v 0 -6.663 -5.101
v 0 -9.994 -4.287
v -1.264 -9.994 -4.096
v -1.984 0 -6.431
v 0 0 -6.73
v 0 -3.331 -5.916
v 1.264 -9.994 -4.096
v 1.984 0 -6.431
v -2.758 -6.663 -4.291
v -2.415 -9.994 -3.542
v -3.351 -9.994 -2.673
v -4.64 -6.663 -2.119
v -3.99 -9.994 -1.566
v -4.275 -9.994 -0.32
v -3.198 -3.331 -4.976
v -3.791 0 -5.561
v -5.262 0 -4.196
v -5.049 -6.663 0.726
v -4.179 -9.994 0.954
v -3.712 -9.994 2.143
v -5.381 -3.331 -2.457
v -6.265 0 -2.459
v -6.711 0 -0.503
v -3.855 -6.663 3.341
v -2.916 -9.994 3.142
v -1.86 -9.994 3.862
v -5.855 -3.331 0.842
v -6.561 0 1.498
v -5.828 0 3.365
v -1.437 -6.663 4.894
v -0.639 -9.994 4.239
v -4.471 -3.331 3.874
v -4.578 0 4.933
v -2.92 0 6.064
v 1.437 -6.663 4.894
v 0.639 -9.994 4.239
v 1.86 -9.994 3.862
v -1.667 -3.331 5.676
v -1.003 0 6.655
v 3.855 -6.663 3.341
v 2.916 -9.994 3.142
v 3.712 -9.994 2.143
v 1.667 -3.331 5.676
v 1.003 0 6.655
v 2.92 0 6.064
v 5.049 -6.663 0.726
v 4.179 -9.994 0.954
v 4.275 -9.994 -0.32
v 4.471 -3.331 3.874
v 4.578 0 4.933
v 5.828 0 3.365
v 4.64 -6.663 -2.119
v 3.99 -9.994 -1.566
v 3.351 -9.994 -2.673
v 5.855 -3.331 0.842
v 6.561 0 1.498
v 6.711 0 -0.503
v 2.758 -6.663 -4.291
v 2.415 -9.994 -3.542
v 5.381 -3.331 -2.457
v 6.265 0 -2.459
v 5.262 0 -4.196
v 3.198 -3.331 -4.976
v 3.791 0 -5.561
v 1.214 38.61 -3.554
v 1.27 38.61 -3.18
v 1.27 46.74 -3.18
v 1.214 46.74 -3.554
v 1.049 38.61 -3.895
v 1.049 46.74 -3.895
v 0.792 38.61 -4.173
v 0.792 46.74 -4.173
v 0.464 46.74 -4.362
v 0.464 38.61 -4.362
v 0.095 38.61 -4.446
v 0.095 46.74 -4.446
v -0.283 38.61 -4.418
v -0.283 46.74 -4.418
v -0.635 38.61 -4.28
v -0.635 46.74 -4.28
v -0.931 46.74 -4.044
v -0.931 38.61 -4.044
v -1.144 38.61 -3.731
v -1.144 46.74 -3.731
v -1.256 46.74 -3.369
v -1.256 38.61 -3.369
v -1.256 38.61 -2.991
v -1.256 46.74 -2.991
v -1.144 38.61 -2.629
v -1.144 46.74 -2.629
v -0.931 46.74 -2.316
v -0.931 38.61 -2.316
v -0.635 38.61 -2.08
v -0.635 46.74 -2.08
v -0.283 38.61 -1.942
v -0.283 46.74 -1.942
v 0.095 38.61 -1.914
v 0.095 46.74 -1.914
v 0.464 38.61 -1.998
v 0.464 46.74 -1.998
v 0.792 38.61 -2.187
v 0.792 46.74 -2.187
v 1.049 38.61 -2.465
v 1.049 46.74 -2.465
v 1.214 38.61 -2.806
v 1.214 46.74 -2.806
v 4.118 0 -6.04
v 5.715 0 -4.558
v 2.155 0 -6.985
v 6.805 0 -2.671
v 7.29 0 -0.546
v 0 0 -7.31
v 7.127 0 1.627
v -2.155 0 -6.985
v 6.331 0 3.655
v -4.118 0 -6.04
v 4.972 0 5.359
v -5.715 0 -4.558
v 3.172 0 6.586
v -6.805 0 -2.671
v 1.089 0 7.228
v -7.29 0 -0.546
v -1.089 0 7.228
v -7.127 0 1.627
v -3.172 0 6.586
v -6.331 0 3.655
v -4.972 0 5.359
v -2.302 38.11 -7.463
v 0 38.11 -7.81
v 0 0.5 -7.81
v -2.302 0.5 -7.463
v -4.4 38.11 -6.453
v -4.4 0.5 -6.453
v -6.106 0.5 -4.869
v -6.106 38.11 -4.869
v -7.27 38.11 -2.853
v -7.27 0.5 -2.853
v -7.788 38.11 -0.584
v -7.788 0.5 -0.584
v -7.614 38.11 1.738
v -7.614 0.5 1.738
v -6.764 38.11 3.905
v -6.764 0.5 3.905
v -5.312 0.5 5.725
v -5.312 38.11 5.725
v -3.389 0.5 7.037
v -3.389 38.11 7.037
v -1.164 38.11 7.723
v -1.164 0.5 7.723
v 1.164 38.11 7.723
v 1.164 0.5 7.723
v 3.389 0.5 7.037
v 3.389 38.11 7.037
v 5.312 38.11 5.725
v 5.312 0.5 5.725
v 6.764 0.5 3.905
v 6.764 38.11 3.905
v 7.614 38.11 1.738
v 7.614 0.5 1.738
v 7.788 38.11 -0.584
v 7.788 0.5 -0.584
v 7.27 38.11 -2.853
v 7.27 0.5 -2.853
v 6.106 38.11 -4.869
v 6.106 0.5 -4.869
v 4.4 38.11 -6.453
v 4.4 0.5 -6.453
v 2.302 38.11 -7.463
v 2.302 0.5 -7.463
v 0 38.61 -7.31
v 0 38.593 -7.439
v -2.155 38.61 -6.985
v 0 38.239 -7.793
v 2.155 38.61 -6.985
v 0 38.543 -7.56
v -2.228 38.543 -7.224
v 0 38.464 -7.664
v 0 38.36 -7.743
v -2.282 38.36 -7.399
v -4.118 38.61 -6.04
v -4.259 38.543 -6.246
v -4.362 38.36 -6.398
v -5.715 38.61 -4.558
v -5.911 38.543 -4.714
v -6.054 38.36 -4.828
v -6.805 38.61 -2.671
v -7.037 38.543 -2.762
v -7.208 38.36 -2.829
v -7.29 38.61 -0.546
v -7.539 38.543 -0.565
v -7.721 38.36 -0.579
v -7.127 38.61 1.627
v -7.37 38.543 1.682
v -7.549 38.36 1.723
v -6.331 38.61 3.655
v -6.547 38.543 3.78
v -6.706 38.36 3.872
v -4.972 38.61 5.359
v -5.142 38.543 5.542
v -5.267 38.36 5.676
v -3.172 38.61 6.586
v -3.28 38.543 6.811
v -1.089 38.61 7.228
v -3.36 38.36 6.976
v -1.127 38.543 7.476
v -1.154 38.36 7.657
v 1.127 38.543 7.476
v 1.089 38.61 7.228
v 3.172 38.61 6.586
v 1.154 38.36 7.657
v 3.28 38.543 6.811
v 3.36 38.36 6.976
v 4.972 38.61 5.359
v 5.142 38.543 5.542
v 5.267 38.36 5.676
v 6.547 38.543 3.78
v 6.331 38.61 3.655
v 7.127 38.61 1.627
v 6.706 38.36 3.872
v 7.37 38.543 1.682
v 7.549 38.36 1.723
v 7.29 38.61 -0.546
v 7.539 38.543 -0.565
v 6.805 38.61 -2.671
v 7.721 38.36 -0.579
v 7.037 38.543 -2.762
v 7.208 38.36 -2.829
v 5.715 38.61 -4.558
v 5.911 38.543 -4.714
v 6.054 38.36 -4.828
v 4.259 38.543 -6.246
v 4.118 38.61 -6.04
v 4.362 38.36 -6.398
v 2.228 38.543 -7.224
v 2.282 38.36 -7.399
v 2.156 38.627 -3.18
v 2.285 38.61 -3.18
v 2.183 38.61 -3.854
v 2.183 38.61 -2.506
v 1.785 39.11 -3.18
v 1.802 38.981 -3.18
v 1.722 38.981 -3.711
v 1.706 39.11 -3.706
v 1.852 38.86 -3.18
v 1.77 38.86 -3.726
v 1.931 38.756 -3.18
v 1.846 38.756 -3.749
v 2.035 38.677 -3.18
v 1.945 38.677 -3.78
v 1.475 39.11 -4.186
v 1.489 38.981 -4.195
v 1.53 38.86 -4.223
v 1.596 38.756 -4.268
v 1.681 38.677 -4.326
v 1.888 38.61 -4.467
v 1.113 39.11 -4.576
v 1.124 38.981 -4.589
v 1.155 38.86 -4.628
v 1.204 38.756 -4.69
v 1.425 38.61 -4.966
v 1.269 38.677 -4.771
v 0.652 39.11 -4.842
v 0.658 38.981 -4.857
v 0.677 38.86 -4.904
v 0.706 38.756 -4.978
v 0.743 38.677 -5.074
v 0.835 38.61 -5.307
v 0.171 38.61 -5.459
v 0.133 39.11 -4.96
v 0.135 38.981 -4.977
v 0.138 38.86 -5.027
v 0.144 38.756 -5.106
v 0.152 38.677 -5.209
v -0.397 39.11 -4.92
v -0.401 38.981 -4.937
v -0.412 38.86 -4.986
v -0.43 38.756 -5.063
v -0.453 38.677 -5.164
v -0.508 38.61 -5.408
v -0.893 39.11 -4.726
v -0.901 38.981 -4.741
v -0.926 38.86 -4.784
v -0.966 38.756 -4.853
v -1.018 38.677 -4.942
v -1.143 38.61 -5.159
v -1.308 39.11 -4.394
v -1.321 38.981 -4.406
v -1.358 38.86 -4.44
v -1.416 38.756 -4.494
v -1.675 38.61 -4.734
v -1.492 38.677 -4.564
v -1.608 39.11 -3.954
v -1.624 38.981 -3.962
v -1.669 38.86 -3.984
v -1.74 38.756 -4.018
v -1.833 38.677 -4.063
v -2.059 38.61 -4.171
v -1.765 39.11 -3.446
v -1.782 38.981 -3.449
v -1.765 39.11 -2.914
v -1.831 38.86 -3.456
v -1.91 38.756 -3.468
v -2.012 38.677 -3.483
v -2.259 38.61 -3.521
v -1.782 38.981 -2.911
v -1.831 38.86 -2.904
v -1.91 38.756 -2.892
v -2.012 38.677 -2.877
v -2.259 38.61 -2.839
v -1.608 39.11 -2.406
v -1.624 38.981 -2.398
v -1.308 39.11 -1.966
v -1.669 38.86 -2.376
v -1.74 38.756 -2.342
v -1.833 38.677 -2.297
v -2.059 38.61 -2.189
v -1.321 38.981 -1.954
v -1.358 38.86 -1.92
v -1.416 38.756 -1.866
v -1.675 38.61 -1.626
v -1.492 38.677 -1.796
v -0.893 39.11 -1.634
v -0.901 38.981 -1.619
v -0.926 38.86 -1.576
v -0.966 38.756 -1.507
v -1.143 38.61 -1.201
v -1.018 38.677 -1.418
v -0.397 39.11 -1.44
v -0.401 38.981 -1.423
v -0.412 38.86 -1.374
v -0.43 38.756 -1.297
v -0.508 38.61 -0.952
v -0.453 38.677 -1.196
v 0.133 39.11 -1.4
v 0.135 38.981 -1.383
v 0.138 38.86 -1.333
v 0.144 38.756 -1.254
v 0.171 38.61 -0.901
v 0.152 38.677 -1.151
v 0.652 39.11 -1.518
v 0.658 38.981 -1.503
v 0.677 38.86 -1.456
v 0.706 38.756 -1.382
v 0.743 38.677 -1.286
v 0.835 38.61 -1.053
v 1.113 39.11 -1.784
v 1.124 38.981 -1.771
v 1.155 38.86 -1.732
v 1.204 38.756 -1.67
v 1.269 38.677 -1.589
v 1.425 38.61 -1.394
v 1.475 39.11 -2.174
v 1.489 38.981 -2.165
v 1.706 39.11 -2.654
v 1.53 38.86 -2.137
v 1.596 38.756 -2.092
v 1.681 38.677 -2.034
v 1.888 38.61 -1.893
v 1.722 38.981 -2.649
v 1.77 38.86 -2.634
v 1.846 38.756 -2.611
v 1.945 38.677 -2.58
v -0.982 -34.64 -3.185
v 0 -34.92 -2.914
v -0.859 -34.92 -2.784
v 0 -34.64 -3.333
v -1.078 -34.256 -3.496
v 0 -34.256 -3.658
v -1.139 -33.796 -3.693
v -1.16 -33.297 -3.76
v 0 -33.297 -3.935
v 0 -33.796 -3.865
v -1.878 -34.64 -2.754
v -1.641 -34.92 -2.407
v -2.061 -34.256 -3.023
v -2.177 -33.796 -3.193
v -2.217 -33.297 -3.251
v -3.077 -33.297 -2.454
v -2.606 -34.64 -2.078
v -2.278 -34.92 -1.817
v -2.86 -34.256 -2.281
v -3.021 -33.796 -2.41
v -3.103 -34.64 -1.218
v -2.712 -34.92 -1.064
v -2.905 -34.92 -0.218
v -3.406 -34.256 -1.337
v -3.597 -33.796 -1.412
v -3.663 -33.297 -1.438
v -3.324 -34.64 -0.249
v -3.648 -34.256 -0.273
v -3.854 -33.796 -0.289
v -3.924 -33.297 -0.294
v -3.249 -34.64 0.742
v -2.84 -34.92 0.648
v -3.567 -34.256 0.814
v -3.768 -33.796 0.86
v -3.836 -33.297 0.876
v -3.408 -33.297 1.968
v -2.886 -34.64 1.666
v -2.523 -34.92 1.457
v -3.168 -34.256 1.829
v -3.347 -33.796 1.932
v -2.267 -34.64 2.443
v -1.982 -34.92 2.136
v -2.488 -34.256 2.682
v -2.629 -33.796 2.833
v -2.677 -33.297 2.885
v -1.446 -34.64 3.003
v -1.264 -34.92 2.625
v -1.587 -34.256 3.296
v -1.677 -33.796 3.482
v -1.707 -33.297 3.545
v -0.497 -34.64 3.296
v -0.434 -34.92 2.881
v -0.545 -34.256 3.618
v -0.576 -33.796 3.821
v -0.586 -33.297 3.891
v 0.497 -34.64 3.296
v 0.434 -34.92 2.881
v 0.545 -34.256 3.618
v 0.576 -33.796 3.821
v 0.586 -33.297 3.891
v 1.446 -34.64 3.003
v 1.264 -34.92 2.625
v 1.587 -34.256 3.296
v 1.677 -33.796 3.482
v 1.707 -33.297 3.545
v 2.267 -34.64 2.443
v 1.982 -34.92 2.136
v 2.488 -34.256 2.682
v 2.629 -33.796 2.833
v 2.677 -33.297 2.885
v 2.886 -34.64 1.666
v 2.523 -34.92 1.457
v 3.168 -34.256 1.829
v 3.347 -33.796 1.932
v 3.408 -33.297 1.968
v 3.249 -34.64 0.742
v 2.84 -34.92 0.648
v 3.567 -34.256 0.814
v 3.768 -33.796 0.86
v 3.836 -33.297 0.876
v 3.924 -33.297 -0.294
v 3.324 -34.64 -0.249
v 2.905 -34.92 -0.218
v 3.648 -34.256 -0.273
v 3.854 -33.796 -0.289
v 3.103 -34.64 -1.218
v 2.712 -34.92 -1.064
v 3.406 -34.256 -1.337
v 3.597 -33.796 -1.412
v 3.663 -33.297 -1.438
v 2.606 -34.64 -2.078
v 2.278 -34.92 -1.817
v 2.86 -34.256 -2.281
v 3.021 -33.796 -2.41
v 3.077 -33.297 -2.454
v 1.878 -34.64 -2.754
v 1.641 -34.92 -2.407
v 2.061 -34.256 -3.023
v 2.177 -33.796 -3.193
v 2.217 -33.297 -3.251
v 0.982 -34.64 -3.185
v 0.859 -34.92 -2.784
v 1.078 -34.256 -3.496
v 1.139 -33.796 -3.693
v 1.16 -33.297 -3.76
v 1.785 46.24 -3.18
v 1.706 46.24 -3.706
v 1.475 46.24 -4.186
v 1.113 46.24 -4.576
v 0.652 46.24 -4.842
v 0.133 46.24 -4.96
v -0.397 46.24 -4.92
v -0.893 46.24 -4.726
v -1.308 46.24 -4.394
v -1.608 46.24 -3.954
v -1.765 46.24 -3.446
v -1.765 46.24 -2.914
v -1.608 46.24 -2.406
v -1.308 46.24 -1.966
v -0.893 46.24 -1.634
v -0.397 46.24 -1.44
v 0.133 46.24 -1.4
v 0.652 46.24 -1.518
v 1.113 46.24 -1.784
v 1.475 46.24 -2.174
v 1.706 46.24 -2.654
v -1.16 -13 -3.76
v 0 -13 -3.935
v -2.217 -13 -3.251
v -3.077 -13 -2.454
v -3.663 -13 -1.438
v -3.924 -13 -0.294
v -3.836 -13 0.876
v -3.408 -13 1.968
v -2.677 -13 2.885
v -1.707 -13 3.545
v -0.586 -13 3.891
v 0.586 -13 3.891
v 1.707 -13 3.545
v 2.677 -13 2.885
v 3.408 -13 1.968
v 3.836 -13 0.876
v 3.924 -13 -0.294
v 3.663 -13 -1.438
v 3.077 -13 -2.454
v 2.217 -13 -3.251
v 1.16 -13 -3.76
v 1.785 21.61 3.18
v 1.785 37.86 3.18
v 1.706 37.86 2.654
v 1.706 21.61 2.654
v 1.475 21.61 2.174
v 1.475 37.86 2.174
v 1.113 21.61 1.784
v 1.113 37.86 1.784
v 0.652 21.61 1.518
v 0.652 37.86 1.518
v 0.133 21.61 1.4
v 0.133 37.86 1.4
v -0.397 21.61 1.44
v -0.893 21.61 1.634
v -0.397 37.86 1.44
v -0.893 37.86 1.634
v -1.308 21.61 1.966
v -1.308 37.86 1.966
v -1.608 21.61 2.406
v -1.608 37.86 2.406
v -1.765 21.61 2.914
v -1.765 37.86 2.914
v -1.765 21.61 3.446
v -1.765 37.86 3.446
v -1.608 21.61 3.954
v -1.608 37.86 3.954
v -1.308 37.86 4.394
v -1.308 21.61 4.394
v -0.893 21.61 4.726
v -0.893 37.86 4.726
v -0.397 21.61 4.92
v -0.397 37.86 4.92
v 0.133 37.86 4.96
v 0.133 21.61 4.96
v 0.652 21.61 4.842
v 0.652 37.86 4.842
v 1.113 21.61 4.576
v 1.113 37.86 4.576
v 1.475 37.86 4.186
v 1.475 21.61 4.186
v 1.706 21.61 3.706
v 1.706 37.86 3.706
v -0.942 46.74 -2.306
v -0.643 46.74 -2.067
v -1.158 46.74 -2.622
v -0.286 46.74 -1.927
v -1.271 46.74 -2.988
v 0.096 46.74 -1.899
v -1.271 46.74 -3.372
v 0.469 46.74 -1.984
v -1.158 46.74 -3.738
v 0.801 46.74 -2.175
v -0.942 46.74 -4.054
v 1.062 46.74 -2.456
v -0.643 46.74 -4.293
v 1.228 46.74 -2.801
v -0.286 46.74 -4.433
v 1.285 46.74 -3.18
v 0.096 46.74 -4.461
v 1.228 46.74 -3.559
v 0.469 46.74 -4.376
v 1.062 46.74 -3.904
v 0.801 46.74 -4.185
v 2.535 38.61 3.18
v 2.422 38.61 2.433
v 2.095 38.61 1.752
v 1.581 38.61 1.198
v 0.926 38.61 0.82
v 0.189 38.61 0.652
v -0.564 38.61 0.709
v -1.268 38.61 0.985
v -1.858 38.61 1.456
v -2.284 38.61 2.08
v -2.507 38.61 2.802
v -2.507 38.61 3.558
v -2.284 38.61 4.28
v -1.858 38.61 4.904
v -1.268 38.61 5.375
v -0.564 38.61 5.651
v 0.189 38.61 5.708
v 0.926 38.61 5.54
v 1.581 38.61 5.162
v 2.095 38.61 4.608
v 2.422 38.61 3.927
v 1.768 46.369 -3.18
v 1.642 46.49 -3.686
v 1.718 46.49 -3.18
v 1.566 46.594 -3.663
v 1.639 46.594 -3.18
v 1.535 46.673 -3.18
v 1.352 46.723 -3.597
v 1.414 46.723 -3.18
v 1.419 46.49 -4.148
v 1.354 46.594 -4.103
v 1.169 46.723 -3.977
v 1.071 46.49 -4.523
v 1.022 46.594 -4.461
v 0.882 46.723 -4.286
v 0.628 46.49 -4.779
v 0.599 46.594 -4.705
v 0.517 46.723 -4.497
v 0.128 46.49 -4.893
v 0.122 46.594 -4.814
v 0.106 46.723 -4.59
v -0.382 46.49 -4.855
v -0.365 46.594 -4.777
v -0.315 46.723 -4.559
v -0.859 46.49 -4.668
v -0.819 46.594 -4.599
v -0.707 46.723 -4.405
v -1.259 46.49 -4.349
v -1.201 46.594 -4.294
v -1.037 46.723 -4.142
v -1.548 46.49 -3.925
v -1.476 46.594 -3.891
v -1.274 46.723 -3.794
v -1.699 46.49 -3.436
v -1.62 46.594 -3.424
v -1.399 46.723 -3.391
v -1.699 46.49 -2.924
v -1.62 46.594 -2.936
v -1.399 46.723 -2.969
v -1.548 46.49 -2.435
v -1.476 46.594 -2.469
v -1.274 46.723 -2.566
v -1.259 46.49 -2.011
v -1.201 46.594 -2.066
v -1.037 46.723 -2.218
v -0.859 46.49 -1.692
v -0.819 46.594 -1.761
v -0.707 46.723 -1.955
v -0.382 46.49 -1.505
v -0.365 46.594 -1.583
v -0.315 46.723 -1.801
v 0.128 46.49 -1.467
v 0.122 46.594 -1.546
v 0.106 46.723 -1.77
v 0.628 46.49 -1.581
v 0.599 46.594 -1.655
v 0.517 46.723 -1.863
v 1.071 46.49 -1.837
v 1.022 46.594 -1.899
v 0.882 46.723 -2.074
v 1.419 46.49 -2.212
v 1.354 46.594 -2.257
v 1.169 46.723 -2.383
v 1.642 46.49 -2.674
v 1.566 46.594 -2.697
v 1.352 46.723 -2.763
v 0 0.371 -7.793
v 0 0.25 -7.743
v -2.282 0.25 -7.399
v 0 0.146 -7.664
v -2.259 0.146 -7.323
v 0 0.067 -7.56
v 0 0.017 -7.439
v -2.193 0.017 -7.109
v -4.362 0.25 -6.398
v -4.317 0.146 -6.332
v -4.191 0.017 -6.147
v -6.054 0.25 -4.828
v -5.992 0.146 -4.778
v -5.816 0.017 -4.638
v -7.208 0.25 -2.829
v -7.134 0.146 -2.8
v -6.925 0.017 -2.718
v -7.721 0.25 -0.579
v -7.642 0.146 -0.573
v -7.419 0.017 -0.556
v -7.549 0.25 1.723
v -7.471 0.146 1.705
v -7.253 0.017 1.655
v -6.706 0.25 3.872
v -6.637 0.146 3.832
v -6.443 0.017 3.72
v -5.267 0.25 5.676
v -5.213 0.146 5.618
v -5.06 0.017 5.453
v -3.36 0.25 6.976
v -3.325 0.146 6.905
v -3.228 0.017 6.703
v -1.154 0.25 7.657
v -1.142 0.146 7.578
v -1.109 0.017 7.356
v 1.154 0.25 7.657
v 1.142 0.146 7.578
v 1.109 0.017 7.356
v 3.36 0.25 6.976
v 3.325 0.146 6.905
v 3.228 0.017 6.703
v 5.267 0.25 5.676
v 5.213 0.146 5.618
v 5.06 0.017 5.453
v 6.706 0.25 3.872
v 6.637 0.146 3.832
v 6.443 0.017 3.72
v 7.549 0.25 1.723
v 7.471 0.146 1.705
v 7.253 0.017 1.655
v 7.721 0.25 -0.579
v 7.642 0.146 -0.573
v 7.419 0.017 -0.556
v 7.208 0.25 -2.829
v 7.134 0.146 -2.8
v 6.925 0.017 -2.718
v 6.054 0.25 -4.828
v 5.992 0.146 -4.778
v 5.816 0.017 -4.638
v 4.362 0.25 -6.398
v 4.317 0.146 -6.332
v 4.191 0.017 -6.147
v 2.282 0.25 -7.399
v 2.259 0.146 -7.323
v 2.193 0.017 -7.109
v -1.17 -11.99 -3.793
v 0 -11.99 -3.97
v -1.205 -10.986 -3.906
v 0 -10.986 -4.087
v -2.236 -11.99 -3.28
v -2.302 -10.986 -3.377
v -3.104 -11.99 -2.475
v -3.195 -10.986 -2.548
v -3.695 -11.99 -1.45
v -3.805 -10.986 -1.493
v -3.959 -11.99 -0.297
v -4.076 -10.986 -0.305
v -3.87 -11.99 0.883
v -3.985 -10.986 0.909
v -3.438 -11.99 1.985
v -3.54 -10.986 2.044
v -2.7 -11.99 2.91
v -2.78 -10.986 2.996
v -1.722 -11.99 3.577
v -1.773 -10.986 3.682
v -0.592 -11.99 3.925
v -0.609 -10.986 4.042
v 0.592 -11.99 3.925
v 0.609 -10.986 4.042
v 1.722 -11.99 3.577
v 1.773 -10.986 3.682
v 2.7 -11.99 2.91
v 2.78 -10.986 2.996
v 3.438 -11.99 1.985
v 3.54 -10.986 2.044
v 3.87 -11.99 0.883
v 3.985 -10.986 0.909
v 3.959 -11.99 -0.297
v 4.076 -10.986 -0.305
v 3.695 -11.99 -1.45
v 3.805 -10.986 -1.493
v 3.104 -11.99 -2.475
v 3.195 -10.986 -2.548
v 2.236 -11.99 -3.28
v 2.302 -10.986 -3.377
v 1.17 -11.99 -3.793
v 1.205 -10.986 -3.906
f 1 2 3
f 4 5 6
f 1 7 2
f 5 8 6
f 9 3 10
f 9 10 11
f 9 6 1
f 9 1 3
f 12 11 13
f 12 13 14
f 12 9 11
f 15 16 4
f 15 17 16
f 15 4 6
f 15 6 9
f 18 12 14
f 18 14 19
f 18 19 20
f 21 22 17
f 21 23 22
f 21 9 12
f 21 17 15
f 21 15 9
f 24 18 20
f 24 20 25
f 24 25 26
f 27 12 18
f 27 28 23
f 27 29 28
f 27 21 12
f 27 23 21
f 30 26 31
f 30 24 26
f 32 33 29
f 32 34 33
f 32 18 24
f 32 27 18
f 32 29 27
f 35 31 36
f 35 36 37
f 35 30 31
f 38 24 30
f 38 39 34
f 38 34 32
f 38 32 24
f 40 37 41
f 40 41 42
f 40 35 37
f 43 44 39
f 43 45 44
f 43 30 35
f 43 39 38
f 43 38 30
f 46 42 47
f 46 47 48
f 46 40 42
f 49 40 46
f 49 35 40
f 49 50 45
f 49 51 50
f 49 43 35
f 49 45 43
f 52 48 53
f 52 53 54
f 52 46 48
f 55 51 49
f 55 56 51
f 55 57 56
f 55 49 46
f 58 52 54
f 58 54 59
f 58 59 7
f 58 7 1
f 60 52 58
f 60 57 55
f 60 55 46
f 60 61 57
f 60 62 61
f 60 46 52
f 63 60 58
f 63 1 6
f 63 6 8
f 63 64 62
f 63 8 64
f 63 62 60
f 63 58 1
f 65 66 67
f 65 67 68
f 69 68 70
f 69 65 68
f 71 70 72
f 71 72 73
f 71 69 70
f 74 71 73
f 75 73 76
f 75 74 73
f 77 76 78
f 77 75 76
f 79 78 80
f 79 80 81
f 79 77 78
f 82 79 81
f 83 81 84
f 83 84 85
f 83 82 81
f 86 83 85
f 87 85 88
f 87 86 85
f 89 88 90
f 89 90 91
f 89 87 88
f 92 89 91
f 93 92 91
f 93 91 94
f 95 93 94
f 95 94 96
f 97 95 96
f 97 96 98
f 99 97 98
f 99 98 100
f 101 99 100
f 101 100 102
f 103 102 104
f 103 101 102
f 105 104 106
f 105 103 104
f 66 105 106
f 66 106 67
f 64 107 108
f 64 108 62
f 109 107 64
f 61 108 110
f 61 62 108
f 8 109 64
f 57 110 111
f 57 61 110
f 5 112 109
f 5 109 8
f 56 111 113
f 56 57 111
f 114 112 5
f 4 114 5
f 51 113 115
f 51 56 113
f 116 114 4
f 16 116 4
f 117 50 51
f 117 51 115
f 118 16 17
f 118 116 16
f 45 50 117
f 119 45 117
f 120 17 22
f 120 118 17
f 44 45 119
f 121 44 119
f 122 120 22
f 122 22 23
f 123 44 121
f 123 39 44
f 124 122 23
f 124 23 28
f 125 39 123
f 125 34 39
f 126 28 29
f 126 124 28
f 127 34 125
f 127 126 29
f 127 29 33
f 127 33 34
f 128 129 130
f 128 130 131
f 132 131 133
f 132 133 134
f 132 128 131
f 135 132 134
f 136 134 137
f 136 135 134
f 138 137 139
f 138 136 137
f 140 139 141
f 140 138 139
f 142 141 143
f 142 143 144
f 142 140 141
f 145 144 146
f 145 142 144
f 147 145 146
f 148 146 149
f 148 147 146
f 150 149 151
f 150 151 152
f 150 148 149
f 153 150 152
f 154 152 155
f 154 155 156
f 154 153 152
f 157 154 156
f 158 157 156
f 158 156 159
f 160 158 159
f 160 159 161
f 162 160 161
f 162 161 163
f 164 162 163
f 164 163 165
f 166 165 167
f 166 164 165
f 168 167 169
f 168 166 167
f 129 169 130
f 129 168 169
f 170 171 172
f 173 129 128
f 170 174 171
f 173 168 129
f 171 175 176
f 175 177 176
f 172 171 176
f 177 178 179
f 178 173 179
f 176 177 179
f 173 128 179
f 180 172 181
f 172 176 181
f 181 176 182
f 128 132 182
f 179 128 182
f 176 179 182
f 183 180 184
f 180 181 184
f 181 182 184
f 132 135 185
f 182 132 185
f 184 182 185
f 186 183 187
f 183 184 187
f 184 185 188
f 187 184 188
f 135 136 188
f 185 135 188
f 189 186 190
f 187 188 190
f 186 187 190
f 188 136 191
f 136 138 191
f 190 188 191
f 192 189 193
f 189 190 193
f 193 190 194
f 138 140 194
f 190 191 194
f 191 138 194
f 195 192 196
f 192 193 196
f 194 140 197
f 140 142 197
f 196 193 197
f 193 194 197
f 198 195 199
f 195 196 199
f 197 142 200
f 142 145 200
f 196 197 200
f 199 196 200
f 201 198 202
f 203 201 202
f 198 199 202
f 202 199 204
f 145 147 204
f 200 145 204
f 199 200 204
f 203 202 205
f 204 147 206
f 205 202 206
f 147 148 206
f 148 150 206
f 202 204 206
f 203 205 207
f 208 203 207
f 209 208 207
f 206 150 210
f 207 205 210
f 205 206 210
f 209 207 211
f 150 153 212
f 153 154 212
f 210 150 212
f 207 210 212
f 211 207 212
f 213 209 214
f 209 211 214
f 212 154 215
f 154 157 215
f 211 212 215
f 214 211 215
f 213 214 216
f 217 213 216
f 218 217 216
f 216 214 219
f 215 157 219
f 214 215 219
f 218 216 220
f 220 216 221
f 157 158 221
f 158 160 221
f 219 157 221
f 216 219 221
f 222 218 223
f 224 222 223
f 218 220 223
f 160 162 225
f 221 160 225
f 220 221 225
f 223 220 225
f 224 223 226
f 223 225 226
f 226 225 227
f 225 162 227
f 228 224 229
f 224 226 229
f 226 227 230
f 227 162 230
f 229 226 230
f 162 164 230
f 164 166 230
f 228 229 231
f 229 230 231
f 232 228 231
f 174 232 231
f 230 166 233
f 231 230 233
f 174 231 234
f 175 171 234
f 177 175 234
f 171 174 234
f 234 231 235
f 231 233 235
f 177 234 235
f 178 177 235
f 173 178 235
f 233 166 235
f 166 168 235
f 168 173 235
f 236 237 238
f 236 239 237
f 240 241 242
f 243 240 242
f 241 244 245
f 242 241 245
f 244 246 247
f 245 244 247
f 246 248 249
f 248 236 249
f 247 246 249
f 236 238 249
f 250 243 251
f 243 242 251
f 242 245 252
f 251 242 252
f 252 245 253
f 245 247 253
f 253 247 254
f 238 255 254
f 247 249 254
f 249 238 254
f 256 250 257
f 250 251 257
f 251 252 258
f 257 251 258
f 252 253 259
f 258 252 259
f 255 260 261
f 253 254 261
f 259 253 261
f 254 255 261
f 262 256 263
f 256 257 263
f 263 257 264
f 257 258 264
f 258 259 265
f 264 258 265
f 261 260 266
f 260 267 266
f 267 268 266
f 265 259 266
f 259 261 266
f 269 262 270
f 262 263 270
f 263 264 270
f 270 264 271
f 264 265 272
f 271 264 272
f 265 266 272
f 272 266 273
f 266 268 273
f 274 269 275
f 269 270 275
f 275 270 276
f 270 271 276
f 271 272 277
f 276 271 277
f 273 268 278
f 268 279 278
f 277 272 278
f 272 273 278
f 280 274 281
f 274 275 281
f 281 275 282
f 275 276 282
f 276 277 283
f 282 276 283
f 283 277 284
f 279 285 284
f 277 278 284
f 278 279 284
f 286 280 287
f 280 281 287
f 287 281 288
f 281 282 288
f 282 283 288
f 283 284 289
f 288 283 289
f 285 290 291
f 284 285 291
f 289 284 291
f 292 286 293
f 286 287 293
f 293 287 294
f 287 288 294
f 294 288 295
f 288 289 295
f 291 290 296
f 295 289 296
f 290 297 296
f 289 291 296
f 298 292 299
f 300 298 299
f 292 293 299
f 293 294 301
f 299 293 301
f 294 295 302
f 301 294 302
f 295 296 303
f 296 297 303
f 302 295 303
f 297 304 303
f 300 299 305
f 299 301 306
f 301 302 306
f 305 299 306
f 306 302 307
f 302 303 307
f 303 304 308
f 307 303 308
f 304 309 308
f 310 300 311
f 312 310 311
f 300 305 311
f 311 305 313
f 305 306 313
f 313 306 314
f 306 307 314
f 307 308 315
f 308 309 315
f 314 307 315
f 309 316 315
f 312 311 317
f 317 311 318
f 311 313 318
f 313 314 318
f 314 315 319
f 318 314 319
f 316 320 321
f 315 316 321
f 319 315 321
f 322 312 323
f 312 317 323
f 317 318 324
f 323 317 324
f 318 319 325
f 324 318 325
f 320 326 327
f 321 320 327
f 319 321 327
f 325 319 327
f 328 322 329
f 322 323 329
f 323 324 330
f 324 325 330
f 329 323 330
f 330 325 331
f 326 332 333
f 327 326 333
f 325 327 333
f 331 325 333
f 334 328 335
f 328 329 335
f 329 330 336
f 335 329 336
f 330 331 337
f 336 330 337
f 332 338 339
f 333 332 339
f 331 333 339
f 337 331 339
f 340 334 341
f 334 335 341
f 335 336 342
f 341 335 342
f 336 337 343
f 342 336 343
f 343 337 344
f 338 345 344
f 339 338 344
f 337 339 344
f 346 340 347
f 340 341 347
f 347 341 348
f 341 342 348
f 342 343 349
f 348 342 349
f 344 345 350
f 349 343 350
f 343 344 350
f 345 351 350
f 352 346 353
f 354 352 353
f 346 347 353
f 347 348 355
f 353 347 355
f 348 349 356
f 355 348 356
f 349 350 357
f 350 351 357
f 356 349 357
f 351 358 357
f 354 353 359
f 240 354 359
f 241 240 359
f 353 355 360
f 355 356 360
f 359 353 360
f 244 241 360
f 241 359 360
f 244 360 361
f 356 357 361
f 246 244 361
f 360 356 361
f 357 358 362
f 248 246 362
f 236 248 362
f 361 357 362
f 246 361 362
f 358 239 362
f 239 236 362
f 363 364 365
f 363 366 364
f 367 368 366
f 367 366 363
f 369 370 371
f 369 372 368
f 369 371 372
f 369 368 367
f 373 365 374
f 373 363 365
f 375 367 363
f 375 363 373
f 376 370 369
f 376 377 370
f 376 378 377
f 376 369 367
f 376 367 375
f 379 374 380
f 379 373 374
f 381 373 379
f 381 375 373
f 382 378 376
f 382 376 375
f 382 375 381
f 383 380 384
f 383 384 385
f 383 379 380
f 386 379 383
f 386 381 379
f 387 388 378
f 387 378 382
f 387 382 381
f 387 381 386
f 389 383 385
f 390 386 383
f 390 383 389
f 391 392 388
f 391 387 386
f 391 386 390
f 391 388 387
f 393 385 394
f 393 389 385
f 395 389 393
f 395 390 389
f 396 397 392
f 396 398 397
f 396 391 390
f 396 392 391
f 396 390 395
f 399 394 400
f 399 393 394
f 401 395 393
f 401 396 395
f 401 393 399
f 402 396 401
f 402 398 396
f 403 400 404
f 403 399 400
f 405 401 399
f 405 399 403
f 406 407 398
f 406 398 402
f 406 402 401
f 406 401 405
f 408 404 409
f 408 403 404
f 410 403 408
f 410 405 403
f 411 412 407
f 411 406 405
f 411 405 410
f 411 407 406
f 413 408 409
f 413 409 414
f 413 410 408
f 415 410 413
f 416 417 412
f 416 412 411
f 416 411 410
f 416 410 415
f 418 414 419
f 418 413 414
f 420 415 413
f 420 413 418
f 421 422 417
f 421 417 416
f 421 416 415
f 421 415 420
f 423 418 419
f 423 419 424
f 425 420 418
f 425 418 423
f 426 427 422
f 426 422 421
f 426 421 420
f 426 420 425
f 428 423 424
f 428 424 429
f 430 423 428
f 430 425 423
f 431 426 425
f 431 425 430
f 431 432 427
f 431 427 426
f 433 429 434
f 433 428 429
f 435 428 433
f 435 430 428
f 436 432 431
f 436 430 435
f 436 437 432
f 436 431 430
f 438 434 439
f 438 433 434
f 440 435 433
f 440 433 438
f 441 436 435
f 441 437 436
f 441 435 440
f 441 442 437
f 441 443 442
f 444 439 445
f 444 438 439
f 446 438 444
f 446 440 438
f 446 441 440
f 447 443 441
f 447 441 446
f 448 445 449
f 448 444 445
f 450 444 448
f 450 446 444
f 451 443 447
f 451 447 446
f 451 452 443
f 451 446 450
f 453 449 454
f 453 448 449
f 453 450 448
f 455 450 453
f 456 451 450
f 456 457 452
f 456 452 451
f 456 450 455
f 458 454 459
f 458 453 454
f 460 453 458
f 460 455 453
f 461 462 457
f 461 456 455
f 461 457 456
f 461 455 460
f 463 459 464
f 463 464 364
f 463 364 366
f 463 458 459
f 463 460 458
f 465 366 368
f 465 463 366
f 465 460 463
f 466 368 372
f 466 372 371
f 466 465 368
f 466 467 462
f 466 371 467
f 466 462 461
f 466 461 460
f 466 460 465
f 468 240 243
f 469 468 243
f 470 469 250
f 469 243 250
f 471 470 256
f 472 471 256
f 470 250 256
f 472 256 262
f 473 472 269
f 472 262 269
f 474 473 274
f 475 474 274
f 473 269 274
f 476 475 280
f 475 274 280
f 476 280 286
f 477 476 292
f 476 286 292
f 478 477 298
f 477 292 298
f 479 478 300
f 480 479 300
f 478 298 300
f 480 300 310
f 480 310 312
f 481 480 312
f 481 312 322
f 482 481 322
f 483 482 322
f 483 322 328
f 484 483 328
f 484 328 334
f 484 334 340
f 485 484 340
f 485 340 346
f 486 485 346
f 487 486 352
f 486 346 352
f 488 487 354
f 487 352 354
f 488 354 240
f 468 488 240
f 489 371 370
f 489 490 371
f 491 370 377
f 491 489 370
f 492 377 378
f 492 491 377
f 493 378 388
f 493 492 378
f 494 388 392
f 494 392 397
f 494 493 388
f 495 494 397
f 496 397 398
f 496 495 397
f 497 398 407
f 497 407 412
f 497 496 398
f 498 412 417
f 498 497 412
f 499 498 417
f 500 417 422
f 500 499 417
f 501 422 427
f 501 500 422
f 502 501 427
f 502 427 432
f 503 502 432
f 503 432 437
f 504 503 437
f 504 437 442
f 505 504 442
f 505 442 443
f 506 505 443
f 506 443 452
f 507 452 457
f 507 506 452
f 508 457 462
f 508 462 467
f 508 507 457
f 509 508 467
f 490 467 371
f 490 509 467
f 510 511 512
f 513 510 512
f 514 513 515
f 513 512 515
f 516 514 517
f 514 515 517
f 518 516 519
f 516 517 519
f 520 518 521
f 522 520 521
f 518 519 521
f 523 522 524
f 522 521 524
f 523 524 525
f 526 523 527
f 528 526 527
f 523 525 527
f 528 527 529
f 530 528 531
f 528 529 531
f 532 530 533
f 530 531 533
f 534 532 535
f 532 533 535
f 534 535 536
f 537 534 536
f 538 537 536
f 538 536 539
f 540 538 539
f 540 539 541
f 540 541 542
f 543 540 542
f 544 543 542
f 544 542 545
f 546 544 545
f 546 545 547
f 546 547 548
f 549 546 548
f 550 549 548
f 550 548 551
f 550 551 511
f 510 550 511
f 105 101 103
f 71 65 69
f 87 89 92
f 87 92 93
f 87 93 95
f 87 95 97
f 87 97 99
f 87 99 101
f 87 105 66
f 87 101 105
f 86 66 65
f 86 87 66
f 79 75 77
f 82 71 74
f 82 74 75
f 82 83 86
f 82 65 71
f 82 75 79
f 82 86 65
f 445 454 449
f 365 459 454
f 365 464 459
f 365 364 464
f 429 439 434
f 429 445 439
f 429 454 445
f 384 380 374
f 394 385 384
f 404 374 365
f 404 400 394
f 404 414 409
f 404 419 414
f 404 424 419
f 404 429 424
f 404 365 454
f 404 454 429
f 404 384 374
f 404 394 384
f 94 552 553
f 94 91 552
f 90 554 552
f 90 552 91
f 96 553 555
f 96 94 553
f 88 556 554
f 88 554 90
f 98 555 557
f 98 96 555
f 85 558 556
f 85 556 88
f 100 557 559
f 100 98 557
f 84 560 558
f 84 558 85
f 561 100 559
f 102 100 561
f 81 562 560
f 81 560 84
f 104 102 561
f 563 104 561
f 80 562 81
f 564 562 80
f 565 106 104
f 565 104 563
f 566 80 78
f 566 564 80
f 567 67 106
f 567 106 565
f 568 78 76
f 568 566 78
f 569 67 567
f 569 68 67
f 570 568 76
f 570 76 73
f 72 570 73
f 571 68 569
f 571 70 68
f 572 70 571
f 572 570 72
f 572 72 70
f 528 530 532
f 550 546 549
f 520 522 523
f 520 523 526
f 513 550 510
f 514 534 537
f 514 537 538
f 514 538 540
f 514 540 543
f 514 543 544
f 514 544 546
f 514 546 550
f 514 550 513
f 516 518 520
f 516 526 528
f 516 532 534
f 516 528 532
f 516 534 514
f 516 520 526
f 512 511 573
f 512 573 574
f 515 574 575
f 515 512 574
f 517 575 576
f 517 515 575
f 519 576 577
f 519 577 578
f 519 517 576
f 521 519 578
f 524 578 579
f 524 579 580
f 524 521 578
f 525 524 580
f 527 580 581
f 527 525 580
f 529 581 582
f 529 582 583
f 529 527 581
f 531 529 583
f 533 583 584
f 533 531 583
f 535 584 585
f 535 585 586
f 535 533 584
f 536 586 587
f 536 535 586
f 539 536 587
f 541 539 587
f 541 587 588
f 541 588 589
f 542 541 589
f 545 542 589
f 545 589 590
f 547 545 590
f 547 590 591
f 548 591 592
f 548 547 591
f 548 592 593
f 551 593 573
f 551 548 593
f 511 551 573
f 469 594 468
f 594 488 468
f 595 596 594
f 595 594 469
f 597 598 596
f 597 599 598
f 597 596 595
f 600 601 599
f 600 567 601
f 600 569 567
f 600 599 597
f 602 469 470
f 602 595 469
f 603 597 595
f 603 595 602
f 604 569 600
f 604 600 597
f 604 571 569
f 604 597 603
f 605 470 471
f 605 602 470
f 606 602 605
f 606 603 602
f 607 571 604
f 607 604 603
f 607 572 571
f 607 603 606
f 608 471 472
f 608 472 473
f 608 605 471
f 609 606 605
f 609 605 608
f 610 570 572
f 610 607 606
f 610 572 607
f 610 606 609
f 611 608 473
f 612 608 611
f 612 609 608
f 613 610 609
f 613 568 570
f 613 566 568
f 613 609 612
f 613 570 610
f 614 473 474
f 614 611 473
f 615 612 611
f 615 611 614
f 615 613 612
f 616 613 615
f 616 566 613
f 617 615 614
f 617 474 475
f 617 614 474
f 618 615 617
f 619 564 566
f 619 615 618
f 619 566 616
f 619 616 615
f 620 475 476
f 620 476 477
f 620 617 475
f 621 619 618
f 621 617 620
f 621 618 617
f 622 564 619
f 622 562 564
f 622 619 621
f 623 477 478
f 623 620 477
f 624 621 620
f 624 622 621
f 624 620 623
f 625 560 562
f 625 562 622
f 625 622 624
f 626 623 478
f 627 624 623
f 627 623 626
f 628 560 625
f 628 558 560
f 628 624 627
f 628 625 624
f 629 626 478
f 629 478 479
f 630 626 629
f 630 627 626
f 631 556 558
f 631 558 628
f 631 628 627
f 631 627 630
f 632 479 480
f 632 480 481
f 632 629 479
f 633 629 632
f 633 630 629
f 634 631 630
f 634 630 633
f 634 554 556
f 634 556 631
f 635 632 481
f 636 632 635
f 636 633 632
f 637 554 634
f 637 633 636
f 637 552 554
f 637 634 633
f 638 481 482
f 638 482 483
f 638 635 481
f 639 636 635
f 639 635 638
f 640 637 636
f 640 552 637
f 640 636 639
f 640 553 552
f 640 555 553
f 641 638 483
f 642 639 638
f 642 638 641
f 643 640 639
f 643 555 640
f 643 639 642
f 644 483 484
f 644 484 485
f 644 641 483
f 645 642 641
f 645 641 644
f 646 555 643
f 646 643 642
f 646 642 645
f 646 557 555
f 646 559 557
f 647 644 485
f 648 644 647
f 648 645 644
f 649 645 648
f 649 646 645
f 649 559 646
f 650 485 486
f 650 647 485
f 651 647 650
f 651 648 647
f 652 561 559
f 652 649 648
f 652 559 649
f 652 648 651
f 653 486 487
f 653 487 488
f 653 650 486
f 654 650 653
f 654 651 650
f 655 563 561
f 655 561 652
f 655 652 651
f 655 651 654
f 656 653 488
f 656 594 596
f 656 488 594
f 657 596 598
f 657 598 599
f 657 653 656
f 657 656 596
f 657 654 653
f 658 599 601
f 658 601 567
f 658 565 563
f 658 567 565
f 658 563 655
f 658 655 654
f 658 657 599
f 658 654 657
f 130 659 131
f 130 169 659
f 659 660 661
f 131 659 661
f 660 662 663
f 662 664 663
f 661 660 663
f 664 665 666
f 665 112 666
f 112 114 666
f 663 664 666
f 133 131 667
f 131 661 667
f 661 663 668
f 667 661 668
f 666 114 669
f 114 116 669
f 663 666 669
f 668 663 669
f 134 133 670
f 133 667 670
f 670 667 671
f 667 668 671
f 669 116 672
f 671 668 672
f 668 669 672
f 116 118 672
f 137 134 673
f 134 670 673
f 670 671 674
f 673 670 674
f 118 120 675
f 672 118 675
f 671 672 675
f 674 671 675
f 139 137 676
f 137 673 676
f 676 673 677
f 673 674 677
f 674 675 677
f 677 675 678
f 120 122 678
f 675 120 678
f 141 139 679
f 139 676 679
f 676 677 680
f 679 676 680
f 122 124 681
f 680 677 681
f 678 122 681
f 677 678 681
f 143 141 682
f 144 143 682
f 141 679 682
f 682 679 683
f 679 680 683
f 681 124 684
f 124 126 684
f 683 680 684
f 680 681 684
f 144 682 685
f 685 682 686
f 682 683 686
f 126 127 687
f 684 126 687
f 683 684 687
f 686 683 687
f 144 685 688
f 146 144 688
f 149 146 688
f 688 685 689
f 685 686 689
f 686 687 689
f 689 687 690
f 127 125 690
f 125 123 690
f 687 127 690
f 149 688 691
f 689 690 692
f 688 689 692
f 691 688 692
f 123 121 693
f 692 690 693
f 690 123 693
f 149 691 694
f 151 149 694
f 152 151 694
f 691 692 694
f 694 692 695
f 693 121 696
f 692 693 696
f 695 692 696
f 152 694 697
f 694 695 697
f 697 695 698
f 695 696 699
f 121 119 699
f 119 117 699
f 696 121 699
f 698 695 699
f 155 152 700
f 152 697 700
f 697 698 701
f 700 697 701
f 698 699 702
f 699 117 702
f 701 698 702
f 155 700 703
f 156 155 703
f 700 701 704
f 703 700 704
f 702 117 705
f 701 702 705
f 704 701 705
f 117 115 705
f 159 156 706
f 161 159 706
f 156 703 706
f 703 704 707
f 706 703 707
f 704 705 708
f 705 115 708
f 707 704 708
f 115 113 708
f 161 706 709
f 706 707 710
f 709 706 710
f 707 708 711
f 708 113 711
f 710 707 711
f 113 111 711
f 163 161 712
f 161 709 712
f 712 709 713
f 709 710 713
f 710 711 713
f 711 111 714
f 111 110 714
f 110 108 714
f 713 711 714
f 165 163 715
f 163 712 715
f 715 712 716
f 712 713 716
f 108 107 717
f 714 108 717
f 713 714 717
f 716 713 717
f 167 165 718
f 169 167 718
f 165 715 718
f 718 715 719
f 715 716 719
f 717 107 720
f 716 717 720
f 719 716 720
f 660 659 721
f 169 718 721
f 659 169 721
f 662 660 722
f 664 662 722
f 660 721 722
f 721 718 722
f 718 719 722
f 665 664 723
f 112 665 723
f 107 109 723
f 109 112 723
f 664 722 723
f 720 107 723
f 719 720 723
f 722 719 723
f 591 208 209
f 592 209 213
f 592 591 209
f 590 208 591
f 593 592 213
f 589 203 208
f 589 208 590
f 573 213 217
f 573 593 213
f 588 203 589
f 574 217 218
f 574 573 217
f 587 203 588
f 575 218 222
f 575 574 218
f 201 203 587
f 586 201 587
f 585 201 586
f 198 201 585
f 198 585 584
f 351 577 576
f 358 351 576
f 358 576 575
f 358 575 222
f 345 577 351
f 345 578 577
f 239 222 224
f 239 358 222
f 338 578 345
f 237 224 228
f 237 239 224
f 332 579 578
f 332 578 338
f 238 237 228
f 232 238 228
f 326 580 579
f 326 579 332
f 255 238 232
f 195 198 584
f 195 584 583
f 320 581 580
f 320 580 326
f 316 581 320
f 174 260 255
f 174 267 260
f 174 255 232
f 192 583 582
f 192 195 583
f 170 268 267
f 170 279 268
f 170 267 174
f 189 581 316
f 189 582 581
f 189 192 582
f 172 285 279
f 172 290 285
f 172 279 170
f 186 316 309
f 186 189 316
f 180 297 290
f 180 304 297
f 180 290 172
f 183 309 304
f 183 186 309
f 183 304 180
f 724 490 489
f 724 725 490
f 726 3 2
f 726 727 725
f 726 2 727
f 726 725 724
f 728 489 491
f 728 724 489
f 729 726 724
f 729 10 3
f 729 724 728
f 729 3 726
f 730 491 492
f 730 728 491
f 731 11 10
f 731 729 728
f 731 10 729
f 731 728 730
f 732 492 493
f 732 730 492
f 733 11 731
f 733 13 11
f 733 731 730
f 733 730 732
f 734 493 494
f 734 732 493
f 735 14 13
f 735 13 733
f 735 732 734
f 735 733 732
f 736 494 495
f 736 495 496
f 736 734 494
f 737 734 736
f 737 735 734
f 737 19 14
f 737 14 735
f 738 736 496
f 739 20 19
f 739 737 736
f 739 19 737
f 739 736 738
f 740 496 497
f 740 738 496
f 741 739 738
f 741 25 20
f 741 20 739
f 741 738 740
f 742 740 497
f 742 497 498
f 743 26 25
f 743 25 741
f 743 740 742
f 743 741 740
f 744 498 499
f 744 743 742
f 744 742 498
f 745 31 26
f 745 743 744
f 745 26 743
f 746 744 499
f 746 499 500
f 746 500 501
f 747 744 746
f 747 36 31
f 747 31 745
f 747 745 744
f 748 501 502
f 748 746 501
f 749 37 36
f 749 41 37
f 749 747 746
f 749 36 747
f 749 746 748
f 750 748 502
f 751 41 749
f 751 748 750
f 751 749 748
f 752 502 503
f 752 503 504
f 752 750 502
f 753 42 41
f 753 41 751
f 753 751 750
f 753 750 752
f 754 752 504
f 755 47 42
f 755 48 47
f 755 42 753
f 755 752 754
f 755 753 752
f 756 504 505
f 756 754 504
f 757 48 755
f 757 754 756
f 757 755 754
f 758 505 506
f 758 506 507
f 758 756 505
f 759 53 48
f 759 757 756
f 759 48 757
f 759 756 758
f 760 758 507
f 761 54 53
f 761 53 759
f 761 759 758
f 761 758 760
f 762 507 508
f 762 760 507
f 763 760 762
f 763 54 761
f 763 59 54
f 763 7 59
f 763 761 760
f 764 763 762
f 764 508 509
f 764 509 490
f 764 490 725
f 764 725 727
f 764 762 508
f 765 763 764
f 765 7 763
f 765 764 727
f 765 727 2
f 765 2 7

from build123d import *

# Parameters (mm, degrees)
SKETCH_2_R          = 1.785
SKETCH_2_R_2        = 1.27
EXTRUDE_2_DEPTH     = 8.13
FILLET_1_R          = 0.5
FILLET_2_R          = 0.5
FILLET_3_R          = 0.5
SKETCH_5_R          = 1.785
CUT_EXTRUDE_1_DEPTH = 18
CHAMFER_1_SIZE      = 0.75


with BuildPart() as part:
    # Эскиз1 → Повернуть1 (revolve)
    with BuildSketch(Plane(origin=(0, 0, 0), x_dir=(0, 0, -1), z_dir=(1, 0, 0))):
        with BuildLine():
            Line((7.81, 0), (7.81, 38.61))
            Line((7.81, 38.61), (0, 38.61))
            Line((0, 38.61), (0, -34.919667125))
            Line((0, -34.919667125), (2.135124109, -34.919667125))
            Line((2.135124109, -34.919667125), (2.913509872, -34.919667125))
            ThreePointArc((2.913509872, -34.919667125), (3.658458343, -34.255552274), (3.935124109, -33.296671252))
            Line((3.935124109, -33.296671252), (3.935124109, -13.000030341))
            ThreePointArc((3.935124109, -13.000030341), (4.018123706, -11.486391771), (4.28668668, -9.994458602))
            Line((4.28668668, -9.994458602), (6.73, 0))
            Line((6.73, 0), (7.81, 0))
        make_face()
    revolve(axis=Axis((0, -34.919667125, 0), (0, 1, 0)))

    # Эскиз2 → Бобышка-Вытянуть2 (add)
    with BuildSketch(Plane(origin=(0, 38.61, 0), x_dir=(1, 0, 0), z_dir=(0, 1, 0))):
        with Locations((0, 3.18)):
            Circle(SKETCH_2_R)
        with Locations((0, 3.18)):
            Circle(SKETCH_2_R_2, mode=Mode.SUBTRACT)
    extrude(amount=EXTRUDE_2_DEPTH)

    # Скругление1
    fillet_1_edges = [part.edges().sort_by_distance(p)[0] for p in [
        (-1.785, 46.74, -3.18),
    ]]
    fillet(fillet_1_edges, radius=FILLET_1_R)

    # Скругление2
    fillet_2_edges = [part.edges().sort_by_distance(p)[0] for p in [
        (-1.785, 38.61, -3.18),
    ]]
    fillet(fillet_2_edges, radius=FILLET_2_R)

    # Скругление3
    fillet_3_edges = [part.edges().sort_by_distance(p)[0] for p in [
        (0, 38.61, 7.81),
        (0, 0, 7.81),
    ]]
    fillet(fillet_3_edges, radius=FILLET_3_R)

    # Эскиз5 → Вырез-Вытянуть1 (cut)
    with BuildSketch(Plane(origin=(0, 39.61, 0), x_dir=(1, 0, 0), z_dir=(0, 1, 0))):
        with Locations((0, -3.18)):
            Circle(SKETCH_5_R)
    extrude(amount=-CUT_EXTRUDE_1_DEPTH, mode=Mode.SUBTRACT)

    # Фаска1
    chamfer_1_edges = [part.edges().sort_by_distance(p)[0] for p in [
        (-1.785, 38.61, 3.18),
    ]]
    chamfer(chamfer_1_edges, length=CHAMFER_1_SIZE)


solid = part.part
